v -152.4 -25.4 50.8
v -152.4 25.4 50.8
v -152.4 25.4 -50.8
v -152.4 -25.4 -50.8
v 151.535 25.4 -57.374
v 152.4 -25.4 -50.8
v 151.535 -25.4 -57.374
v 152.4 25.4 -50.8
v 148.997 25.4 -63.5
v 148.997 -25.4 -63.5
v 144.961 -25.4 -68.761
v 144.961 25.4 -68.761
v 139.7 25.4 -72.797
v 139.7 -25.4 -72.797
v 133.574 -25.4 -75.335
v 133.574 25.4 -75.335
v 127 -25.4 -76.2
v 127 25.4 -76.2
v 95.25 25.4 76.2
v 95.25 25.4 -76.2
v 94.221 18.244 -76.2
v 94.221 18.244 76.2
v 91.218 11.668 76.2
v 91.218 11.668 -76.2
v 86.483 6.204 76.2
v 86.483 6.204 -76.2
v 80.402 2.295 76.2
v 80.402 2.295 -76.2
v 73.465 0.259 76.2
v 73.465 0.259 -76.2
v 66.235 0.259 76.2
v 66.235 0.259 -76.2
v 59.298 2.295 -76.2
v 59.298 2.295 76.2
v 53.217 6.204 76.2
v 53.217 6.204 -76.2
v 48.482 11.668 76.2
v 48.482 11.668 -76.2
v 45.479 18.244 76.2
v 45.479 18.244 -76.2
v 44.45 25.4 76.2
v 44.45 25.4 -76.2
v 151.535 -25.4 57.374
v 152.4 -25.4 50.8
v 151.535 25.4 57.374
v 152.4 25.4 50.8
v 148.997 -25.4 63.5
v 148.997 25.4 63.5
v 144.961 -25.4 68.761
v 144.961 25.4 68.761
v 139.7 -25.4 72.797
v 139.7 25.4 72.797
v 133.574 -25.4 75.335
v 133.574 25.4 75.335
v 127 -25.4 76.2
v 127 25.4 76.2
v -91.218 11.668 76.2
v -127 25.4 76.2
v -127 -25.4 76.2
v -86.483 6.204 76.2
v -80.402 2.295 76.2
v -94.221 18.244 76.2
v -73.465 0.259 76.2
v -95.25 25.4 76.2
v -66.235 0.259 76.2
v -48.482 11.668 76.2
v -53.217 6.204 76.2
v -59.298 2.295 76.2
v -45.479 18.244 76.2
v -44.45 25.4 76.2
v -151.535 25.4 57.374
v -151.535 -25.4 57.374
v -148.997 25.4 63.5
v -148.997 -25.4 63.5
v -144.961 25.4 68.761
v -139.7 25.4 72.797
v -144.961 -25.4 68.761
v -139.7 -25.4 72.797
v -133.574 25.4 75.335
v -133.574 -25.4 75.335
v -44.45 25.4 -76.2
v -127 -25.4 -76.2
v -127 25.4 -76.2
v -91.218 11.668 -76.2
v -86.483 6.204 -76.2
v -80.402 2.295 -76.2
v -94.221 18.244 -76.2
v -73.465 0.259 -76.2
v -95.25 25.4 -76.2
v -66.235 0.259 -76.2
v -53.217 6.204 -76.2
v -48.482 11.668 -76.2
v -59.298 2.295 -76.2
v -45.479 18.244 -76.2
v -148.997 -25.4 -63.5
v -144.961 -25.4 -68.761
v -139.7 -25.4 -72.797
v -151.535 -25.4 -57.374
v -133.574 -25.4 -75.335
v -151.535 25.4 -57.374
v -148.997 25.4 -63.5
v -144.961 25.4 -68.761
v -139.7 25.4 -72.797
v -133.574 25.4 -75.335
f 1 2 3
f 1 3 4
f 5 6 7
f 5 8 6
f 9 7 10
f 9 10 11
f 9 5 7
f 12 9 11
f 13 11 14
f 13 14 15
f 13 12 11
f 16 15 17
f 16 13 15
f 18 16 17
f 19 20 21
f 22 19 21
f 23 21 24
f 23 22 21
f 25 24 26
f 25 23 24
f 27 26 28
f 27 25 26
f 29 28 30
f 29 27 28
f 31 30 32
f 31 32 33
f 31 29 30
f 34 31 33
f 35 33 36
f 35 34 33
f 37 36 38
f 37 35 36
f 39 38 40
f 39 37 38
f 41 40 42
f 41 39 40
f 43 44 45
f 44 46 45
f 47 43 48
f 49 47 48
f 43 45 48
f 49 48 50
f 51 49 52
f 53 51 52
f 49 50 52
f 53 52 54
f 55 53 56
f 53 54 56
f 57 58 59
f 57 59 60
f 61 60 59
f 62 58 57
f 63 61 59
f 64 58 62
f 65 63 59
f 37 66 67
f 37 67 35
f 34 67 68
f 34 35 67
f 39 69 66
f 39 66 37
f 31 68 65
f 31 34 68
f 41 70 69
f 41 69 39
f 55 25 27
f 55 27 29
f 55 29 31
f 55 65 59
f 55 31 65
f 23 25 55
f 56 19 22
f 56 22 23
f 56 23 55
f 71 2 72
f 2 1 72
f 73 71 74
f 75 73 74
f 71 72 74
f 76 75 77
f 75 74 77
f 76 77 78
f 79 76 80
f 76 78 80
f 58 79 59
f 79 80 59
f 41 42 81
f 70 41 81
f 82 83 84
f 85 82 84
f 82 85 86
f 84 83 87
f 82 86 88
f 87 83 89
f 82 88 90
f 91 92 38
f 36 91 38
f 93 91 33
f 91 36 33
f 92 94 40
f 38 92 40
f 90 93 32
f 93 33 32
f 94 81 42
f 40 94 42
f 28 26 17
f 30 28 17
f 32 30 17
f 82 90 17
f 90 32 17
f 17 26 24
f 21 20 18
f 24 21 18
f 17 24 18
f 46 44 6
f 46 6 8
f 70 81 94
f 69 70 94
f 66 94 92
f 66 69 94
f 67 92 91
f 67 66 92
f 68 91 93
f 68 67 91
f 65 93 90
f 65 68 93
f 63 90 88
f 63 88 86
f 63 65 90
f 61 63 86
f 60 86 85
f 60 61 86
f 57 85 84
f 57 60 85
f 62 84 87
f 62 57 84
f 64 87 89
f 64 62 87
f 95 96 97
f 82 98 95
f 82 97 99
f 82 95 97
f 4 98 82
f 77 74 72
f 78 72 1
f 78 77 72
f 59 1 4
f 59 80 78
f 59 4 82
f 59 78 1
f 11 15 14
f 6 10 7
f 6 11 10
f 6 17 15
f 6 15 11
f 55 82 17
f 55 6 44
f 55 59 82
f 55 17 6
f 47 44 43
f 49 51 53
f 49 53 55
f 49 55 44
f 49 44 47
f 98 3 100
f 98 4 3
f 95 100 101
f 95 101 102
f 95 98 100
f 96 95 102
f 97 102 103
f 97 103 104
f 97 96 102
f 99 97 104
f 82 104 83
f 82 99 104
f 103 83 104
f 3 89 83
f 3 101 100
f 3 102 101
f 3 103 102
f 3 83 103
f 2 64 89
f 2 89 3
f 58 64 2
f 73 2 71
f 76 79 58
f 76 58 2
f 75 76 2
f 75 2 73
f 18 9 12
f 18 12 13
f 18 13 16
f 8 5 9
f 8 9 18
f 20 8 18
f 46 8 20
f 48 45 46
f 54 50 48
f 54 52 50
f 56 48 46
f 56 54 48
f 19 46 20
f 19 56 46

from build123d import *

# Parameters (mm, degrees)
BOSS_EXTRUDE1_DEPTH = 76.2
FILLET1_R           = 25.4


with BuildPart() as part:
    # Sketch1 → Boss-Extrude1 (new, symmetric)
    with BuildSketch(Plane.XY):
        with BuildLine():
            Line((-152.4, 25.4), (-152.4, -25.4))
            Line((-152.4, -25.4), (152.4, -25.4))
            Line((152.4, -25.4), (152.4, 25.4))
            Line((152.4, 25.4), (95.25, 25.4))
            ThreePointArc((95.25, 25.4), (69.85, 0), (44.45, 25.4))
            Line((44.45, 25.4), (-44.45, 25.4))
            ThreePointArc((-44.45, 25.4), (-69.85, 0), (-95.25, 25.4))
            Line((-95.25, 25.4), (-152.4, 25.4))
        make_face()
    extrude(amount=BOSS_EXTRUDE1_DEPTH, both=True)

    # Fillet1
    fillet1_edges = [part.edges().sort_by_distance(p)[0] for p in [
        (-152.4, 0, -76.2),
        (-152.4, 0, 76.2),
        (152.4, 0, 76.2),
        (152.4, 0, -76.2),
    ]]
    fillet(fillet1_edges, radius=FILLET1_R)


solid = part.part
